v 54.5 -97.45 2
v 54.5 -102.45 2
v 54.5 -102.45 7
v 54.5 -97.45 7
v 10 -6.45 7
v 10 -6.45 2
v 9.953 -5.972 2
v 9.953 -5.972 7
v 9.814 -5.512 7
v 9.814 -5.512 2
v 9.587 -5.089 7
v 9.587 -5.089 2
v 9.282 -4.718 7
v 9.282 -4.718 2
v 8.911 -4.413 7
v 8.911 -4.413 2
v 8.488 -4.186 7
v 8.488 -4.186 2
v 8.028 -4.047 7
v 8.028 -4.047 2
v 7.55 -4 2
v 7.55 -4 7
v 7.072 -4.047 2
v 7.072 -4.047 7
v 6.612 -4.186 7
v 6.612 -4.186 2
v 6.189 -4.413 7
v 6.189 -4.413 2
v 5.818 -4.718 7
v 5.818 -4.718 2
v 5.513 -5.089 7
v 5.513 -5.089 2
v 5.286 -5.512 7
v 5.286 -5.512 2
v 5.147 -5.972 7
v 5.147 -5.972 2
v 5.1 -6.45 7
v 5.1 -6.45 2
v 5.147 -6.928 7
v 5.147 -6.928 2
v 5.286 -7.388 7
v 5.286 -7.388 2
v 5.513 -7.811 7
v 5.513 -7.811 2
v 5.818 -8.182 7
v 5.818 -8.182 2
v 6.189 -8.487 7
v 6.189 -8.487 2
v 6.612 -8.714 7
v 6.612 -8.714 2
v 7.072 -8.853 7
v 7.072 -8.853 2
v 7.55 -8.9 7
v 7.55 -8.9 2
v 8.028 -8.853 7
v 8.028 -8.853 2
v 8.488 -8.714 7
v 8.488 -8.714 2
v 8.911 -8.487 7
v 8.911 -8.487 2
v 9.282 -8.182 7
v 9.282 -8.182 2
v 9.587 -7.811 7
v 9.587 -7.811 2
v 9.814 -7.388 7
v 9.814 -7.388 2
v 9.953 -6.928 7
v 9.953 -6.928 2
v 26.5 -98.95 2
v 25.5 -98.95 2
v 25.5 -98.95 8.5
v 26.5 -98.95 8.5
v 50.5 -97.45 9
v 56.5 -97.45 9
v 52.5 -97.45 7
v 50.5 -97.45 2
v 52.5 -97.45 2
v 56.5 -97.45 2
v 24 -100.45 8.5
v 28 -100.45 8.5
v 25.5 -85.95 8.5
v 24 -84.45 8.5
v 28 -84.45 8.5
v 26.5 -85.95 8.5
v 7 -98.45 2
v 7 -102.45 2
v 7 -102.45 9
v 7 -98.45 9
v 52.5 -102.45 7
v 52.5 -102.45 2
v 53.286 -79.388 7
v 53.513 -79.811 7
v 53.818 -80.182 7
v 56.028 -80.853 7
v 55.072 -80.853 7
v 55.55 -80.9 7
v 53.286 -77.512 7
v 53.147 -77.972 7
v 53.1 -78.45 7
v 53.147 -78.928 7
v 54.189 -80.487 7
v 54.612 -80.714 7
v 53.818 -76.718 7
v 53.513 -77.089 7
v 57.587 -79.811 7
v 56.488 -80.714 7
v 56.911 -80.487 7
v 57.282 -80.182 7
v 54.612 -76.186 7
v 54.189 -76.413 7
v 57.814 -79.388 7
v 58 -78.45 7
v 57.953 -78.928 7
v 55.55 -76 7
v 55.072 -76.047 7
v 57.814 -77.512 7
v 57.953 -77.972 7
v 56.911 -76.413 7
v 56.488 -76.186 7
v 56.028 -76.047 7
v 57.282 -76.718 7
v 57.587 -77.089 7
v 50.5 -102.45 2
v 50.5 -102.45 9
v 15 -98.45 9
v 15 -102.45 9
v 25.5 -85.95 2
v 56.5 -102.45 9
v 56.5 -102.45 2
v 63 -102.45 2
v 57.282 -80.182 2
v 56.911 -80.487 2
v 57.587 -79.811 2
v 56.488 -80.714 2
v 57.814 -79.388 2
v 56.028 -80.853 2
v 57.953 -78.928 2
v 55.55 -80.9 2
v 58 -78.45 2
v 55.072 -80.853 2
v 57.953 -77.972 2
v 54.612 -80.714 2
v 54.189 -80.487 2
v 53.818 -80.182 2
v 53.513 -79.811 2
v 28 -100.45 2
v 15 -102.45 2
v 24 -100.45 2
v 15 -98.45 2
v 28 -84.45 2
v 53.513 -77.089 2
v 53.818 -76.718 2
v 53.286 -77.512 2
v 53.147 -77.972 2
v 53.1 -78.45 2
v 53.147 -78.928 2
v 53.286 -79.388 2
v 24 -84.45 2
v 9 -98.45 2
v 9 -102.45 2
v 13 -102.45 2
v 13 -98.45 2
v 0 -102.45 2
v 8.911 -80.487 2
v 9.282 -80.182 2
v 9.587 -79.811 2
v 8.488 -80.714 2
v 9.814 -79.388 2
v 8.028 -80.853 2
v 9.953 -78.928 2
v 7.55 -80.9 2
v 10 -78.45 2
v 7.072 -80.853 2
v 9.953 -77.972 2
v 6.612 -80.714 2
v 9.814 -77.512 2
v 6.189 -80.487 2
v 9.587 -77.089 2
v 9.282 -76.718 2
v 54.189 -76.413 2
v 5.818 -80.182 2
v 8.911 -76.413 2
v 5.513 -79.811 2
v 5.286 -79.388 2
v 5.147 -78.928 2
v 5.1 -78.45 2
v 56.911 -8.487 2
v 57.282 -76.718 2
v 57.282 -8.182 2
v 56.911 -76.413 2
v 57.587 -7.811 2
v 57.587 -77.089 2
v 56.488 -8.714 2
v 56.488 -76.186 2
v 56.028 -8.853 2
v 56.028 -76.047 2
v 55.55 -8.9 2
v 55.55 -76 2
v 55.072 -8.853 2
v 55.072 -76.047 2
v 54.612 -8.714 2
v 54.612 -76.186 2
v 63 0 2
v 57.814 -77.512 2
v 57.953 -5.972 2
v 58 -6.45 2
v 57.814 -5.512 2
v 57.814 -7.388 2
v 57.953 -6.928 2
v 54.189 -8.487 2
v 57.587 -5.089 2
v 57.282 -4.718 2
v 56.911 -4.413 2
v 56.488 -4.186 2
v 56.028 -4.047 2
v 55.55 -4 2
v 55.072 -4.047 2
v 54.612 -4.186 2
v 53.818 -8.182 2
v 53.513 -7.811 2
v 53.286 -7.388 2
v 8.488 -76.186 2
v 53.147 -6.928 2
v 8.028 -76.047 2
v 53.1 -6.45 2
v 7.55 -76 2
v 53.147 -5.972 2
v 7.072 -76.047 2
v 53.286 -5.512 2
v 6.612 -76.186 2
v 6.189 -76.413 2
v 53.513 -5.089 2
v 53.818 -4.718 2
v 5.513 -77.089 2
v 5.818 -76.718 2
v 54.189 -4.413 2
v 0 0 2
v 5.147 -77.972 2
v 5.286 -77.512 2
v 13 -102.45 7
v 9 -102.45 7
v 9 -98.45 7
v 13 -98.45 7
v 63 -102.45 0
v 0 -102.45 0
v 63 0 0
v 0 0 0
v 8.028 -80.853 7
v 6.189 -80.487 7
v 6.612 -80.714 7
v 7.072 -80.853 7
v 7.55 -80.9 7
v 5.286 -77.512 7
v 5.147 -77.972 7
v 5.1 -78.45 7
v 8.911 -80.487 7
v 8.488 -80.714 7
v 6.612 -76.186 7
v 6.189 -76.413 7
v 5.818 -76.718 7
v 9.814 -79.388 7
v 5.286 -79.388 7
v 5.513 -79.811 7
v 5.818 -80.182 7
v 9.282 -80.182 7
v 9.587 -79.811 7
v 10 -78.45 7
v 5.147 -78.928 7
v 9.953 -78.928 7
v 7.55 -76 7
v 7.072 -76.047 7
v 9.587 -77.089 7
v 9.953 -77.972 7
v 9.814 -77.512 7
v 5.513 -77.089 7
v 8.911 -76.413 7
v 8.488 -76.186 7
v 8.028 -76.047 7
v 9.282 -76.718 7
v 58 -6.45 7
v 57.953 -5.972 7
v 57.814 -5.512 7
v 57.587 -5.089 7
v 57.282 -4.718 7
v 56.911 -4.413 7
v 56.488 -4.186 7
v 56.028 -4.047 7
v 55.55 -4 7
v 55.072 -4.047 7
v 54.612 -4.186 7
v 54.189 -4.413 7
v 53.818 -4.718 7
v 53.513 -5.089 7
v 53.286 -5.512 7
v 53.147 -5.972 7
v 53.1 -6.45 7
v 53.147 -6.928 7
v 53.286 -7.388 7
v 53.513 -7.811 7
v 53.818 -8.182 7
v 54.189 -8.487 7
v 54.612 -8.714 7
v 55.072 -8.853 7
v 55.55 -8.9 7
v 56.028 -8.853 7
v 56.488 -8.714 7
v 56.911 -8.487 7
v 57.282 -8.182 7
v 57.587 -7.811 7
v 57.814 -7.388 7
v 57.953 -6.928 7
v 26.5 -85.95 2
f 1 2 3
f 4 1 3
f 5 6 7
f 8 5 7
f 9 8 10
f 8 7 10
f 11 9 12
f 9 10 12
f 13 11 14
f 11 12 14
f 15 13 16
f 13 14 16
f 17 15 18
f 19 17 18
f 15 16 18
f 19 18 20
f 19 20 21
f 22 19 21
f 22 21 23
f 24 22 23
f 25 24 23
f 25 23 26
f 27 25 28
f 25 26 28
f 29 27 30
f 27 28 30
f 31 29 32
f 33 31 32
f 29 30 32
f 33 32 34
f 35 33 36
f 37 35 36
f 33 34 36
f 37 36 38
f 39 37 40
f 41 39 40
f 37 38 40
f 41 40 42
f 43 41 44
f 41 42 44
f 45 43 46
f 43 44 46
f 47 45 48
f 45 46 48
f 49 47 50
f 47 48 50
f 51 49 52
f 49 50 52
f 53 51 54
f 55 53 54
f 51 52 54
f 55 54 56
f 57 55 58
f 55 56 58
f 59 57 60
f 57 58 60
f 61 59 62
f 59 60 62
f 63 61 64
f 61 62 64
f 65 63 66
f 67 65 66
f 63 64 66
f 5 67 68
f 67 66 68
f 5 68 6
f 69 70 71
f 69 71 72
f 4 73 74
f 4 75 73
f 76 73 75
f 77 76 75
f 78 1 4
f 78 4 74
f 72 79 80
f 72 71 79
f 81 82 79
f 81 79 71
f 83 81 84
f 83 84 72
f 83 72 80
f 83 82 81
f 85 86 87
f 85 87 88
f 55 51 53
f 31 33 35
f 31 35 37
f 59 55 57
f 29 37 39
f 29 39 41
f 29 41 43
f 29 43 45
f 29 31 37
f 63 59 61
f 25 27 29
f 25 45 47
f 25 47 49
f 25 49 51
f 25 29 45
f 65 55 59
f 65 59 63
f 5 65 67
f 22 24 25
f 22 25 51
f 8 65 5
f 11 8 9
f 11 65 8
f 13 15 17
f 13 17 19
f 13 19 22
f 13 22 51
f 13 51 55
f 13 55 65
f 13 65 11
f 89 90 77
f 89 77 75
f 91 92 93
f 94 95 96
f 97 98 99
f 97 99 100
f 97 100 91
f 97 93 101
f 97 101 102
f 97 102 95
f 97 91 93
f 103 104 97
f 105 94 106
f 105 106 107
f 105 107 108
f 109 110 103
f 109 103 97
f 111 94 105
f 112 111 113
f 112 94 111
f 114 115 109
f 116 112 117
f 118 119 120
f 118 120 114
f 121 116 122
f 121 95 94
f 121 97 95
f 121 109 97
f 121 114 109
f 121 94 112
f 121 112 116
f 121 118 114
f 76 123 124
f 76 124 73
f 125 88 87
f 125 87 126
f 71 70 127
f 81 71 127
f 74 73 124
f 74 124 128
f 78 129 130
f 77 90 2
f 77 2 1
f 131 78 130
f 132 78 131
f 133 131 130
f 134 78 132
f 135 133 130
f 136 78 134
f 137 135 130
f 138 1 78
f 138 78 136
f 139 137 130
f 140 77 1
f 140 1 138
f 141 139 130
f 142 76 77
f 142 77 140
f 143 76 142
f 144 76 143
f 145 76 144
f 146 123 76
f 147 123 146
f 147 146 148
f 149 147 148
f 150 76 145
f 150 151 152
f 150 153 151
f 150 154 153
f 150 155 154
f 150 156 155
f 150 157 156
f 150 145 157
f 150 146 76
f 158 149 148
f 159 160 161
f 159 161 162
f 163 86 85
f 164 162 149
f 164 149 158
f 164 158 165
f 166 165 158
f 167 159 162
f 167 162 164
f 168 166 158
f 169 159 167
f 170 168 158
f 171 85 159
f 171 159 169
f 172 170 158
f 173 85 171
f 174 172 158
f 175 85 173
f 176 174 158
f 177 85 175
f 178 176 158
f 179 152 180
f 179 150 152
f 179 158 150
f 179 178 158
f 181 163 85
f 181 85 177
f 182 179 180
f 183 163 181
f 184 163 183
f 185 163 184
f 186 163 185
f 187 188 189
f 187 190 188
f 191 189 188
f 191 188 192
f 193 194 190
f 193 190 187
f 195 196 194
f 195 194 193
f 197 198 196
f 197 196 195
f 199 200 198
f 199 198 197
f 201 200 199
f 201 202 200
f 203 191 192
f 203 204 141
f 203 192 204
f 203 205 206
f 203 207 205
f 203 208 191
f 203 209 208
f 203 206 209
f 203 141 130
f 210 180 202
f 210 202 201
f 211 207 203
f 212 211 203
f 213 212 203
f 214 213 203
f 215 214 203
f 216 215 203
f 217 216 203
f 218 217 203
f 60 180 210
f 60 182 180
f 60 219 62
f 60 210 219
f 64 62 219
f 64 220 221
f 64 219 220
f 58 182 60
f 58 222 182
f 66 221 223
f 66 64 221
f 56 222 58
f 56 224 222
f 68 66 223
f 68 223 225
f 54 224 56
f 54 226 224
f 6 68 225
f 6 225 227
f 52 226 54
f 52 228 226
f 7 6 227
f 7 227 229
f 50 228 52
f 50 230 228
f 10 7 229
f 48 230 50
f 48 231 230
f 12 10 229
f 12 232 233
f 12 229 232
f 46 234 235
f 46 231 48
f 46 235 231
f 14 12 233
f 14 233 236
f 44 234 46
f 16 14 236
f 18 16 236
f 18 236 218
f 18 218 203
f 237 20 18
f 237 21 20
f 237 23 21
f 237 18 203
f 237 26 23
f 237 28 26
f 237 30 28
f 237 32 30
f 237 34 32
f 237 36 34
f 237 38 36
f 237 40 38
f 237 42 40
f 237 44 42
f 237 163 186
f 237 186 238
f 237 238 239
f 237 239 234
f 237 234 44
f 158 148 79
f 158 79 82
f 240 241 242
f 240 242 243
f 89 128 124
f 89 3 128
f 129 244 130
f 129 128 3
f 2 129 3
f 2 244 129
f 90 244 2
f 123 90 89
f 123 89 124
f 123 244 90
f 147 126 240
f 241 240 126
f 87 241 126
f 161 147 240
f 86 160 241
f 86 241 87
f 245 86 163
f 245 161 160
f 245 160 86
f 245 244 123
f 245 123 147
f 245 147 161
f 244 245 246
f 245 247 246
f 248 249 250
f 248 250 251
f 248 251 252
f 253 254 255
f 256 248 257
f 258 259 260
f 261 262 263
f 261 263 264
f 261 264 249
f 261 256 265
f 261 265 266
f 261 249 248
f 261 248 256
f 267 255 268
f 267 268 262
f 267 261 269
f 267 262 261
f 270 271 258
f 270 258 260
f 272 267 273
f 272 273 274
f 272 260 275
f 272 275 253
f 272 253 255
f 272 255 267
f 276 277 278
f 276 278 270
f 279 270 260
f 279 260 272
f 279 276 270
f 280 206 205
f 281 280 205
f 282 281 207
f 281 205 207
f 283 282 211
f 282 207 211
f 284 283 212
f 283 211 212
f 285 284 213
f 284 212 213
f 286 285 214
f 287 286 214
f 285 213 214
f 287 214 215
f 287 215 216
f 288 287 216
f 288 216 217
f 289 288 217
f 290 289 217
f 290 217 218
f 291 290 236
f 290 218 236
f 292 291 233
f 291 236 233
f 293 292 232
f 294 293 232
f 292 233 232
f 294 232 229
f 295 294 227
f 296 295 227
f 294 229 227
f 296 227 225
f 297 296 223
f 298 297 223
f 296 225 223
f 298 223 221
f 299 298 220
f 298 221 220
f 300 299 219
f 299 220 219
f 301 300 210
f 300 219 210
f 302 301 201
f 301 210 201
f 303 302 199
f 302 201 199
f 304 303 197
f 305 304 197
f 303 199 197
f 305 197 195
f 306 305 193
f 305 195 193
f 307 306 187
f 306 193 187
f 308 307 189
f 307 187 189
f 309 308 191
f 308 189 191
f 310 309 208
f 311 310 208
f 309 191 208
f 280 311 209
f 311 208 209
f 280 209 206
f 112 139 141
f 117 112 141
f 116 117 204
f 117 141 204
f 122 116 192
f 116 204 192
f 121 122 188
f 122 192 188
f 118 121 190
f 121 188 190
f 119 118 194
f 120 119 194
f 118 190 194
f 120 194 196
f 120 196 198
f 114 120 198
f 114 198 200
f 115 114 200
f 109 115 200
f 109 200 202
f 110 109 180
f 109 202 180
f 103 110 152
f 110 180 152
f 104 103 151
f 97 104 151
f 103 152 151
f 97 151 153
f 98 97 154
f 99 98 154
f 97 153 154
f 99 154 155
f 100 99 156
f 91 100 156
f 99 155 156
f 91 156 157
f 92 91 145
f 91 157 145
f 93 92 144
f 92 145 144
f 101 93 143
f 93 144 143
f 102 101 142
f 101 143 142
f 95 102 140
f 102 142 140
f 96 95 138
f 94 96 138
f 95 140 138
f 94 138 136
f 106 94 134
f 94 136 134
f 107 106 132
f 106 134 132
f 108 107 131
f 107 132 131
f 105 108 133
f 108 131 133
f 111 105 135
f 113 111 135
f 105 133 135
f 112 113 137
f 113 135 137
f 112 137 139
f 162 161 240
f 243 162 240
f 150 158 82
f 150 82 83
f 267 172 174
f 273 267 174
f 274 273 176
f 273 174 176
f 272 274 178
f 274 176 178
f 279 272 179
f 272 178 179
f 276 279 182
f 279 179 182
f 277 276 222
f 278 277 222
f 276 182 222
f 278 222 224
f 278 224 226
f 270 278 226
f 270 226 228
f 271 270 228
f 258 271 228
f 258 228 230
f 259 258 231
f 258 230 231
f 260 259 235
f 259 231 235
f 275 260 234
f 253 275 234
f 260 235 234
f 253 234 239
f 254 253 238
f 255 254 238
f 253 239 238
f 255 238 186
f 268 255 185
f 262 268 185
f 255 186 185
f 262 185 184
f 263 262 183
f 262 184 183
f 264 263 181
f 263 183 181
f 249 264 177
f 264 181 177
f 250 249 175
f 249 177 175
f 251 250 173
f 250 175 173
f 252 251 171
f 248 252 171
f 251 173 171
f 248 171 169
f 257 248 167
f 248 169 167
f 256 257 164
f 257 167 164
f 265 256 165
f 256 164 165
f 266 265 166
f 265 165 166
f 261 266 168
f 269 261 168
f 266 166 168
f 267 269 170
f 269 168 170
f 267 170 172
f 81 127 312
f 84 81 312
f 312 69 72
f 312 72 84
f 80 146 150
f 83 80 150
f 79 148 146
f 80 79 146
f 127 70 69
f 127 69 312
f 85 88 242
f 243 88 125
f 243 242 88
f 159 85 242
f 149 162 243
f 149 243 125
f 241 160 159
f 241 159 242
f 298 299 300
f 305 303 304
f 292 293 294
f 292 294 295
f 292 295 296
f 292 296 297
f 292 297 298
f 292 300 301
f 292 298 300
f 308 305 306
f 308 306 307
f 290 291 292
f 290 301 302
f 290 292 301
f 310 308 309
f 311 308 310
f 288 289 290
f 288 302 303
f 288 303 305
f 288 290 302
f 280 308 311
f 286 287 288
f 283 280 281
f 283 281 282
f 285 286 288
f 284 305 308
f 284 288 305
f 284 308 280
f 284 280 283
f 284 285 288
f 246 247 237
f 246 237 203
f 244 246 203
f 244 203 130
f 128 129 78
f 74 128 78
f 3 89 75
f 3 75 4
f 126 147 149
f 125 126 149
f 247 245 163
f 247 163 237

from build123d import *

# Parameters (mm, degrees)
P_IDAT_VYSUNUT_M1_DEPTH   = 2
SKICA3_R                  = 2.45
P_IDAT_VYSUNUT_M3_DEPTH   = 5
P_IDAT_VYSUNUT_M4_DEPTH   = 37.5
SKICA8_W                  = 10
SKICA8_H                  = 10
ODEBRAT_VYSUNUT_M2_DEPTH  = 136.974087605
SKICA10_W                 = 27.5
SKICA10_H                 = 79
ODEBRAT_VYSUNUT_M3_DEPTH  = 3
P_IDAT_VYSUNUT_M5_DEPTH   = 1
SKICA13_W                 = 3
SKICA13_H                 = 36.5
ODEBRAT_VYSUNUT_M6_DEPTH  = 127.590886323
SKICA14_W                 = 3
SKICA14_H                 = 36.5
ODEBRAT_VYSUNUT_M7_DEPTH  = 127.590886323
SKICA15_W                 = 36.5
SKICA15_H                 = 3
ODEBRAT_VYSUNUT_M8_DEPTH  = 136.974087605
SKICA19_W                 = 37
SKICA19_H                 = 13
ODEBRAT_VYSUNUT_M9_DEPTH  = 132.581543159
SKICA20_W                 = 63
SKICA20_H                 = 102.45
SKICA20_W_2               = 57
SKICA20_H_2               = 79
ODEBRAT_VYSUNUT_M10_DEPTH = 1
SKICA22_W                 = 8
SKICA22_H                 = 4
SKICA22_W_2               = 6
SKICA22_H_2               = 5
P_IDAT_VYSUNUT_M6_DEPTH   = 7
SKICA23_W                 = 4
SKICA23_H                 = 5
SKICA23_W_2               = 2
ODEBRAT_VYSUNUT_M12_DEPTH = 5
SKICA25_W                 = 4
SKICA25_H                 = 16
SKICA25_W_2               = 1
SKICA25_H_2               = 13
P_IDAT_VYSUNUT_M8_DEPTH   = 6.5


with BuildPart() as part:
    # Skica1 → Přidat vysunutím1 (new body)
    with BuildSketch(Plane.XY):
        Polygon((13, -102.45), (13, -115.45), (50, -115.45), (50, -102.45), (63, -102.45), (63, 0), (0, 0), (0, -102.45), align=None)
    extrude(amount=P_IDAT_VYSUNUT_M1_DEPTH)

    # Skica3 → Přidat vysunutím3 (add)
    with BuildSketch(Plane.XY.offset(2)):
        with Locations((7.55, -6.45)):
            Circle(SKICA3_R)
        with Locations((7.55, -78.45)):
            Circle(SKICA3_R)
        with Locations((55.55, -78.45)):
            Circle(SKICA3_R)
        with Locations((55.55, -6.45)):
            Circle(SKICA3_R)
    extrude(amount=P_IDAT_VYSUNUT_M3_DEPTH)

    # Skica4 → Přidat vysunutím4 (add)
    with BuildSketch(Plane.XY.offset(2)):
        Polygon((63, 0), (63, -102.45), (60, -102.45), (60, -3), (3, -3), (3, -102.45), (0, -102.45), (0, 0), align=None)
    extrude(amount=P_IDAT_VYSUNUT_M4_DEPTH)

    # Skica8 → Odebrat vysunutím2 (cut, through all)
    with BuildSketch(Plane.ZY.offset(-60)):
        with Locations((7, -49)):
            Rectangle(SKICA8_W, SKICA8_H)
    extrude(amount=-ODEBRAT_VYSUNUT_M2_DEPTH, mode=Mode.SUBTRACT)

    # Skica10 → Odebrat vysunutím3 (cut)
    with BuildSketch(Plane.ZY):
        with Locations((25.75, -42.5)):
            Rectangle(SKICA10_W, SKICA10_H)
    extrude(amount=-ODEBRAT_VYSUNUT_M3_DEPTH, mode=Mode.SUBTRACT)

    # Skica11 → Přidat vysunutím5 (add)
    with BuildSketch(Plane.XY.offset(2)):
        Polygon((3, -82), (60, -82), (60, -102.45), (50, -102.45), (50, -115.45), (13, -115.45), (13, -102.45), (3, -102.45), align=None)
    extrude(amount=P_IDAT_VYSUNUT_M5_DEPTH)

    # Skica13 → Odebrat vysunutím6 (cut, through all)
    with BuildSketch(Plane.XZ.offset(102.45)):
        with Locations((1.5, 21.25)):
            Rectangle(SKICA13_W, SKICA13_H)
    extrude(amount=-ODEBRAT_VYSUNUT_M6_DEPTH, mode=Mode.SUBTRACT)

    # Skica14 → Odebrat vysunutím7 (cut, through all)
    with BuildSketch(Plane.XZ.offset(102.45)):
        with Locations((61.5, 21.25)):
            Rectangle(SKICA14_W, SKICA14_H)
    extrude(amount=-ODEBRAT_VYSUNUT_M7_DEPTH, mode=Mode.SUBTRACT)

    # Skica15 → Odebrat vysunutím8 (cut, through all)
    with BuildSketch(Plane.ZY.offset(-3)):
        with Locations((21.25, -1.5)):
            Rectangle(SKICA15_W, SKICA15_H)
    extrude(amount=-ODEBRAT_VYSUNUT_M8_DEPTH, mode=Mode.SUBTRACT)

    # Skica19 → Odebrat vysunutím9 (cut, through all)
    with BuildSketch(Plane.XY.offset(3)):
        with Locations((31.5, -108.95)):
            Rectangle(SKICA19_W, SKICA19_H)
    extrude(amount=-ODEBRAT_VYSUNUT_M9_DEPTH, mode=Mode.SUBTRACT)

    # Skica20 → Odebrat vysunutím10 (cut)
    with BuildSketch(Plane.XY.offset(3)):
        with Locations((31.5, -51.225)):
            Rectangle(SKICA20_W, SKICA20_H)
        with Locations((31.5, -42.5)):
            Rectangle(SKICA20_W_2, SKICA20_H_2, mode=Mode.SUBTRACT)
    extrude(amount=-ODEBRAT_VYSUNUT_M10_DEPTH, mode=Mode.SUBTRACT)

    # Skica22 → Přidat vysunutím6 (add)
    with BuildSketch(Plane.XY.offset(2)):
        with Locations((11, -100.45)):
            Rectangle(SKICA22_W, SKICA22_H)
        with Locations((53.5, -99.95)):
            Rectangle(SKICA22_W_2, SKICA22_H_2)
    extrude(amount=P_IDAT_VYSUNUT_M6_DEPTH)

    # Skica23 → Odebrat vysunutím12 (cut)
    with BuildSketch(Plane.XZ.offset(102.45)):
        with Locations((11, 4.5)):
            Rectangle(SKICA23_W, SKICA23_H)
        with Locations((53.5, 4.5)):
            Rectangle(SKICA23_W_2, SKICA23_H)
    extrude(amount=-ODEBRAT_VYSUNUT_M12_DEPTH, mode=Mode.SUBTRACT)

    # Skica25 → Přidat vysunutím8 (add)
    with BuildSketch(Plane.XY.offset(2)):
        with Locations((26, -92.45)):
            Rectangle(SKICA25_W, SKICA25_H)
        with Locations((26, -92.45)):
            Rectangle(SKICA25_W_2, SKICA25_H_2, mode=Mode.SUBTRACT)
    extrude(amount=P_IDAT_VYSUNUT_M8_DEPTH)


solid = part.part
